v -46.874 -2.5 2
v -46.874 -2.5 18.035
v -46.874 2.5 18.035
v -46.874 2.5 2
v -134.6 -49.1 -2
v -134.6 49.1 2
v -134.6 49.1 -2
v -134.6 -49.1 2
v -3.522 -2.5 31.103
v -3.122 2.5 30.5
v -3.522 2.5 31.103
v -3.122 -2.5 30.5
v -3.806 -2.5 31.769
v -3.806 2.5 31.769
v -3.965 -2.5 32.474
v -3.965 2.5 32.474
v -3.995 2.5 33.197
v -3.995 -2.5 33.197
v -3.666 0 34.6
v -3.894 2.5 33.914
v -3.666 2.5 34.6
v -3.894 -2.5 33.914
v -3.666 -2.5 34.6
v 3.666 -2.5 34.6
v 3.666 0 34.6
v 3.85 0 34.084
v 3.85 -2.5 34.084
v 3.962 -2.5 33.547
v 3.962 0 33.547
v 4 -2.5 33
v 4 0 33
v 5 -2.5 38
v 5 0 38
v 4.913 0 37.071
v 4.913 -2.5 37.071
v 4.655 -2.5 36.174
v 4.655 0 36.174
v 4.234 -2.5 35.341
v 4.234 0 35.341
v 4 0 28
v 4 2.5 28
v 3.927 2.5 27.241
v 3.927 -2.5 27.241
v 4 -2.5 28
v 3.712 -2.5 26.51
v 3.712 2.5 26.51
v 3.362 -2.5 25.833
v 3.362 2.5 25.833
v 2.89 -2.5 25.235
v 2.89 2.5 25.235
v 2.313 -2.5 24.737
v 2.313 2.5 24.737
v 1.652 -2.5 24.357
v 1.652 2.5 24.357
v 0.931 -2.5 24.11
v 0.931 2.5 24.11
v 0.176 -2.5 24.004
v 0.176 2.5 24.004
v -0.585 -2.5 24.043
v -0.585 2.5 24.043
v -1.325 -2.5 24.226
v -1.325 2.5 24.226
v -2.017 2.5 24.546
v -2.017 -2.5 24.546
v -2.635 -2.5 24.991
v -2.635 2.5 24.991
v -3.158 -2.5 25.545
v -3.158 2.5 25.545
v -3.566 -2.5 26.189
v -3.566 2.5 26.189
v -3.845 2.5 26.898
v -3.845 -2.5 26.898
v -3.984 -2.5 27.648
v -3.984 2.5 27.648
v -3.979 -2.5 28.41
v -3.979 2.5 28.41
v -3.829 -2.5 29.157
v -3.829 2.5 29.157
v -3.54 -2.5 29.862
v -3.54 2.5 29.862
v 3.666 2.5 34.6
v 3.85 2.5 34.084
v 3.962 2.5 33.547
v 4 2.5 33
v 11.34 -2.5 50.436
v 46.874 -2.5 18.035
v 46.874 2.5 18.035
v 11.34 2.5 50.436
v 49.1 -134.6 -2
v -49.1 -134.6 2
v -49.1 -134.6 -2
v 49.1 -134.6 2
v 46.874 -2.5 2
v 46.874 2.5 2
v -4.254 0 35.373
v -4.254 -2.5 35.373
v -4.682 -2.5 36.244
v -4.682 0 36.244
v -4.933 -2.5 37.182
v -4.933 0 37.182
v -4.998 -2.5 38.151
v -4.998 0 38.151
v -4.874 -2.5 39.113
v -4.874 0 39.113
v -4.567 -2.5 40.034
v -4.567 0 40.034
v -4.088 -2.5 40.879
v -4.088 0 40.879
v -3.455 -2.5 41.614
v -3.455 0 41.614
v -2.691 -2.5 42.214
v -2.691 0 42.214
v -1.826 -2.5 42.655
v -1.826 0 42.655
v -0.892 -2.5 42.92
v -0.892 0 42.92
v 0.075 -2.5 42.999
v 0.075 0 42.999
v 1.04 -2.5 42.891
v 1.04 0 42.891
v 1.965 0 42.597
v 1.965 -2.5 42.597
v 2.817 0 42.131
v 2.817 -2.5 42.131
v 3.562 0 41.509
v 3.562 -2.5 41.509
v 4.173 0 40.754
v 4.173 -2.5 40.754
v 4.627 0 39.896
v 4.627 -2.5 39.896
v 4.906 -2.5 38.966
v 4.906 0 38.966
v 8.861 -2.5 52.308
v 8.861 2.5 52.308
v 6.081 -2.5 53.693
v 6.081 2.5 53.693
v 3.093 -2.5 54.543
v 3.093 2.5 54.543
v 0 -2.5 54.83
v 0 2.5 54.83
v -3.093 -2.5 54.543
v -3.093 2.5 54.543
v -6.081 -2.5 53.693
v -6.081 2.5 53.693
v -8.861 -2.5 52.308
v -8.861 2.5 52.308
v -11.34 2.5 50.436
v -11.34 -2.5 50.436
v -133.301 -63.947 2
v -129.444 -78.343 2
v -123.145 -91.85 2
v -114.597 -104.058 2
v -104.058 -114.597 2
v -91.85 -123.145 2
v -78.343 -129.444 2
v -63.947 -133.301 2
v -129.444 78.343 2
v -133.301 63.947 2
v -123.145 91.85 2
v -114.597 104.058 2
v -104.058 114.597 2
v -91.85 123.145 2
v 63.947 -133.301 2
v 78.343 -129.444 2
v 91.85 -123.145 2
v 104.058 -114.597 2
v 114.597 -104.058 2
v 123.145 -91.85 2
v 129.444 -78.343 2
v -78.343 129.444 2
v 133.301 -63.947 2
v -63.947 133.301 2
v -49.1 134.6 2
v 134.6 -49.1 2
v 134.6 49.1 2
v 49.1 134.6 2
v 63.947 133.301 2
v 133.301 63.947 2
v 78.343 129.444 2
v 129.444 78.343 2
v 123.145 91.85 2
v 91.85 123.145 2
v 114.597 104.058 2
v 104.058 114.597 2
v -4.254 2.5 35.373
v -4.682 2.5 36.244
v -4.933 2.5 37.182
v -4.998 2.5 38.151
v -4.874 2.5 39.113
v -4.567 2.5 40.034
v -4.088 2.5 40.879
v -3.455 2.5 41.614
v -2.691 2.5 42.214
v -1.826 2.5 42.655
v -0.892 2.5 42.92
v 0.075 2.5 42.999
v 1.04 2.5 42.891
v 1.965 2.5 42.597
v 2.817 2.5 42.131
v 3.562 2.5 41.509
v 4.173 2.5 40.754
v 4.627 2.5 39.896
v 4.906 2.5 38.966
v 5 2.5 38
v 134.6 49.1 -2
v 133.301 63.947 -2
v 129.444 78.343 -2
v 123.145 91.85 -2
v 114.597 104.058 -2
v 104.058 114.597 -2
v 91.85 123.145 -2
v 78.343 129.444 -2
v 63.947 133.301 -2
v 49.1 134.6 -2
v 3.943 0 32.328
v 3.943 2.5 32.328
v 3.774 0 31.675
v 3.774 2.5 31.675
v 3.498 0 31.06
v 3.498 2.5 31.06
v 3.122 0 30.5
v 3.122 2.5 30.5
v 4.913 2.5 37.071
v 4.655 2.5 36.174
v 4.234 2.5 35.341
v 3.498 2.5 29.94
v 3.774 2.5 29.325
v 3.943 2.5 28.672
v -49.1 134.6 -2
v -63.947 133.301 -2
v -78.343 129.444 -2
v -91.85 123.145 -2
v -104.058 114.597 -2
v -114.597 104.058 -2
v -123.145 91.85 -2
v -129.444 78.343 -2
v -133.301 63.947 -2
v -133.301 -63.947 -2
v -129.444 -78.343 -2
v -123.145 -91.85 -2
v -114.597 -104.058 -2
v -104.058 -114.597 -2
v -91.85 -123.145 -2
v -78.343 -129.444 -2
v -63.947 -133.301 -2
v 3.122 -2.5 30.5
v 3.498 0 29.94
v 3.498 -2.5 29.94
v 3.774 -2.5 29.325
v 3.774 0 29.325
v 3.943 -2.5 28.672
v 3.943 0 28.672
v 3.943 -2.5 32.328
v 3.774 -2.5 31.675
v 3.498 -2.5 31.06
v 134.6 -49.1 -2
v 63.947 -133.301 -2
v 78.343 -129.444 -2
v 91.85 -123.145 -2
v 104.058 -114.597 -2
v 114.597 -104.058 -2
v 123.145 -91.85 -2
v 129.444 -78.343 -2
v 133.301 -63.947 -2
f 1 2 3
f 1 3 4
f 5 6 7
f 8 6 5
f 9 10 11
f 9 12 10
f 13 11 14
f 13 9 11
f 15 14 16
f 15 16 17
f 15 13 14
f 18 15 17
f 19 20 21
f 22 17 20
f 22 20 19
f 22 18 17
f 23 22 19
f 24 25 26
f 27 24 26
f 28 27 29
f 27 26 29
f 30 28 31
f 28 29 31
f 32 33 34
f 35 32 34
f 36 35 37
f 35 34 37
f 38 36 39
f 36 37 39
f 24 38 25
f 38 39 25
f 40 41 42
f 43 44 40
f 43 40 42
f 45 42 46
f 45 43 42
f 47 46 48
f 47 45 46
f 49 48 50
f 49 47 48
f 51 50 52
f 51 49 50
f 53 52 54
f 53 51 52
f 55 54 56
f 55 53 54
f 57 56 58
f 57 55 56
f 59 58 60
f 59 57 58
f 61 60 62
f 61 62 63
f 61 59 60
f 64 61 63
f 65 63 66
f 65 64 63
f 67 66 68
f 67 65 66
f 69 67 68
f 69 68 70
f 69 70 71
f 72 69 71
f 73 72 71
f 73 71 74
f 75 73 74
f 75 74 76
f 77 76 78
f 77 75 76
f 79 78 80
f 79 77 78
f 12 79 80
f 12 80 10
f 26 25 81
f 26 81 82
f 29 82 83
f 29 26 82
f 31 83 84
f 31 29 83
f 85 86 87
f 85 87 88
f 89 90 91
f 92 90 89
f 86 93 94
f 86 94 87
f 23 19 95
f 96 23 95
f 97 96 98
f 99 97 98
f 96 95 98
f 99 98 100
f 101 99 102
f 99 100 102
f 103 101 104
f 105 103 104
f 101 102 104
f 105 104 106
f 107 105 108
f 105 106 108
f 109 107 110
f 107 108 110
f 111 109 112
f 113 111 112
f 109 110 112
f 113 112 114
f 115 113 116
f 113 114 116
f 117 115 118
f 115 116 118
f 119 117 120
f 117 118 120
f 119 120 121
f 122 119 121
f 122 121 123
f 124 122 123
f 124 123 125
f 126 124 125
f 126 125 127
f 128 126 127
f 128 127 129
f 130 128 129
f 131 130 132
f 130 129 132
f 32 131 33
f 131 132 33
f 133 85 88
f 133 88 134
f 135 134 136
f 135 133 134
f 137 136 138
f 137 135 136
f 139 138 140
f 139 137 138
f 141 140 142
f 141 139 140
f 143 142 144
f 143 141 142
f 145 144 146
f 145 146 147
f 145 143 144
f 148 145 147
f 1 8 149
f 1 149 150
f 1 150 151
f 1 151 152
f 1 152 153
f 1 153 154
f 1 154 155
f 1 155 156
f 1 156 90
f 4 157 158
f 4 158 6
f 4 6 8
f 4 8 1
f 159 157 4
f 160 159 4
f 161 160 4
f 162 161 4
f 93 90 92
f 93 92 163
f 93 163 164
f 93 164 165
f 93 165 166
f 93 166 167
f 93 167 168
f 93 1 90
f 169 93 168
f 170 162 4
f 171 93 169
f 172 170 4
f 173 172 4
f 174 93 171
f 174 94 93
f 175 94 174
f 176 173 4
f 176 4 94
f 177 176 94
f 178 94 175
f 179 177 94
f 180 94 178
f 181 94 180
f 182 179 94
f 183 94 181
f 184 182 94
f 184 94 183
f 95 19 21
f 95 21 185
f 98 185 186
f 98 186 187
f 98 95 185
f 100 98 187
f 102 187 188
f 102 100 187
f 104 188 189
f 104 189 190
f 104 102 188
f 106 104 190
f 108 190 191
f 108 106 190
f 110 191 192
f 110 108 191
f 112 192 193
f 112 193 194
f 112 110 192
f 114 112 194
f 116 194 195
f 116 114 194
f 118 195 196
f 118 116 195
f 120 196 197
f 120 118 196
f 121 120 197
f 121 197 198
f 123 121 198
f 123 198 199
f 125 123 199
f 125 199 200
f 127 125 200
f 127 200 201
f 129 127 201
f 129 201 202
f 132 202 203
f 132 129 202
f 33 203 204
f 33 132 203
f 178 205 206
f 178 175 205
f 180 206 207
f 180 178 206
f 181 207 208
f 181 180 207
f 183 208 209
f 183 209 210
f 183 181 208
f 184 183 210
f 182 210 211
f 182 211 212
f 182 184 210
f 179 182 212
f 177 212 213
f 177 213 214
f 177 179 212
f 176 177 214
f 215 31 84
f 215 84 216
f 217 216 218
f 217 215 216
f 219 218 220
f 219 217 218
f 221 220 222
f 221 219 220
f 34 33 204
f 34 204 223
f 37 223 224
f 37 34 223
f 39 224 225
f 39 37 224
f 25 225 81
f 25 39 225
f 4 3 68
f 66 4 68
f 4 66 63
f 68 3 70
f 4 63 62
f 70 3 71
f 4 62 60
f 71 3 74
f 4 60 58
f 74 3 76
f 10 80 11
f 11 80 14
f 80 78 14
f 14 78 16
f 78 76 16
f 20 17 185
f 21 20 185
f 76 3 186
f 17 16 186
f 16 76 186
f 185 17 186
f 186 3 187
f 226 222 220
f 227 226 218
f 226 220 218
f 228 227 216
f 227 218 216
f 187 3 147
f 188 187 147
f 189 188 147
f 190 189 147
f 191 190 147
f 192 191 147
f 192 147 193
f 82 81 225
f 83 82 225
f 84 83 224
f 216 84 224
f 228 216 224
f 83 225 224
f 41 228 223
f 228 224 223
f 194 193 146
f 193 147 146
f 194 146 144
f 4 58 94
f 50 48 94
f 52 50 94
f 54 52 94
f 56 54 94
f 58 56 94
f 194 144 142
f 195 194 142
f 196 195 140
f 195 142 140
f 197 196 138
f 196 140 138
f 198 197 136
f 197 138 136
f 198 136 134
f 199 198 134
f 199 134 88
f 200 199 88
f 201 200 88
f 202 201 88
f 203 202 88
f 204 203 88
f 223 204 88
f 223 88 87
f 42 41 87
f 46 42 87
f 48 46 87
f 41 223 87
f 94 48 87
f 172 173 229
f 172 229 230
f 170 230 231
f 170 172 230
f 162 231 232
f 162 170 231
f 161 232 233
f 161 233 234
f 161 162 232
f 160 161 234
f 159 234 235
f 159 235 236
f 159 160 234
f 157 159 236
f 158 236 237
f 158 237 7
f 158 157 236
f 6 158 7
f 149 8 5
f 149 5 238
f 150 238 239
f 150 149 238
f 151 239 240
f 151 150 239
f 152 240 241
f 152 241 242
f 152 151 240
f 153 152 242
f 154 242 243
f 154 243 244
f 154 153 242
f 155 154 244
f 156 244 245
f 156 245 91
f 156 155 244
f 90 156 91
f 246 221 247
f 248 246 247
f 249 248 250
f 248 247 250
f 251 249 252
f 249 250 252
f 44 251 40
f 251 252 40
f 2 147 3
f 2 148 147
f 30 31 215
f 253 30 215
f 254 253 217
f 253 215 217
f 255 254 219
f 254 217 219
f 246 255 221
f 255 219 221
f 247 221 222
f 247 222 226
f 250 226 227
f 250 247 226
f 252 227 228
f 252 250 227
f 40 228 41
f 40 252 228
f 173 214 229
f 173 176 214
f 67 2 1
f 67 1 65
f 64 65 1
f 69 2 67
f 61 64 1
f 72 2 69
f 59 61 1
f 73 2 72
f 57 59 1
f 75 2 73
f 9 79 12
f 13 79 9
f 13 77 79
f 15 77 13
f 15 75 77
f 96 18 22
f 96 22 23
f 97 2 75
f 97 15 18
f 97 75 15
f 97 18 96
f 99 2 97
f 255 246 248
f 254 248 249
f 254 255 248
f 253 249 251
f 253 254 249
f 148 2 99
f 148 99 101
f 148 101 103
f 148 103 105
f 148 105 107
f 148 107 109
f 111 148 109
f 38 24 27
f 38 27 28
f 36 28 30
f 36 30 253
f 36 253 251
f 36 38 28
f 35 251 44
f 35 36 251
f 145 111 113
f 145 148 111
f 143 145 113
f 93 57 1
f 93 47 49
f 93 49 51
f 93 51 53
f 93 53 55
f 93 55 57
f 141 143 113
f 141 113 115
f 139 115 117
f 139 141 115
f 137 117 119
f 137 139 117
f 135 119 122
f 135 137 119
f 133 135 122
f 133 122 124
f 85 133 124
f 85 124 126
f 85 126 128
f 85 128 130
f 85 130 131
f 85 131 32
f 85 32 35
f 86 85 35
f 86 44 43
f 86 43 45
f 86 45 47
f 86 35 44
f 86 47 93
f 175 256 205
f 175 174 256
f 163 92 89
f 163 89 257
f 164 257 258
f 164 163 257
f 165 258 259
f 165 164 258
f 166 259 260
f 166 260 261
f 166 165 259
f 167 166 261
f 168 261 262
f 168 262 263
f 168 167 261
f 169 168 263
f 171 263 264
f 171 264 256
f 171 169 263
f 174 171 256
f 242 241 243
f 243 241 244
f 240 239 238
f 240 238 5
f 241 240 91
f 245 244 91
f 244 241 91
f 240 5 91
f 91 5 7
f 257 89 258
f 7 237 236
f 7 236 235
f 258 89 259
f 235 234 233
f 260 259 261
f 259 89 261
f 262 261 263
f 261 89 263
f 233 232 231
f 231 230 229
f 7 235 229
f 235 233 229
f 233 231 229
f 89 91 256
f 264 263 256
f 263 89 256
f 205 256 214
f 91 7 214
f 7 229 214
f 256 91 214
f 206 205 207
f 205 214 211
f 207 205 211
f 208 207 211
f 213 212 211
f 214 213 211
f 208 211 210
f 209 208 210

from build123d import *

# Parameters (mm, degrees)
F1_DEPTH = 2
F3_DEPTH = 2.5


with BuildPart() as f1:
    # F0 (on Top) → F1 (new body, symmetric)
    with BuildSketch(Plane.XY):
        with BuildLine():
            Line((49.1, 134.6), (-49.1, 134.6))
            ThreePointArc((-49.1, 134.6), (-109.5576297914, 109.5576297914), (-134.6, 49.1))
            Line((-134.6, 49.1), (-134.6, -49.1))
            ThreePointArc((-134.6, -49.1), (-109.5576297914, -109.5576297914), (-49.1, -134.6))
            Line((-49.1, -134.6), (49.1, -134.6))
            ThreePointArc((49.1, -134.6), (109.5576297914, -109.5576297914), (134.6, -49.1))
            Line((134.6, -49.1), (134.6, 49.1))
            ThreePointArc((134.6, 49.1), (109.5576297914, 109.5576297914), (49.1, 134.6))
        make_face()
    extrude(amount=F1_DEPTH, both=True)

    # F2 (on Front) → F3 (join, symmetric)
    with BuildSketch(Plane.XZ):
        with BuildLine():
            Line((-46.8736924231, 0), (0, 0))
            Line((0, 0), (46.8736924231, 0))
            Line((46.8736924231, 0), (46.8736924231, 18.0345661938))
            Line((46.8736924231, 18.0345661938), (11.3395565202, 50.4359355817))
            ThreePointArc((11.3395565202, 50.4359355817), (0, 54.829677236), (-11.3395565202, 50.4359355817))
            Line((-11.3395565202, 50.4359355817), (-46.8736924231, 18.0345661938))
            Line((-46.8736924231, 18.0345661938), (-46.8736924231, 0))
        make_face()
        with BuildLine():
            ThreePointArc((-3.666060556, 34.6), (-1.8261567868, 42.6545839116), (5, 38))
            ThreePointArc((5, 38), (4.6545839116, 36.1738432132), (3.666060556, 34.6))
            ThreePointArc((3.666060556, 34.6), (3.9156252517, 33.8172385748), (4, 33))
            ThreePointArc((4, 33), (3.7742546282, 31.6752351146), (3.1224989992, 30.5))
            ThreePointArc((3.1224989992, 30.5), (3.7742546282, 29.3247648854), (4, 28))
            ThreePointArc((4, 28), (-1.3247648854, 24.2257453718), (-3.1224989992, 30.5))
            ThreePointArc((-3.1224989992, 30.5), (-3.9653039239, 32.4742959088), (-3.666060556, 34.6))
        make_face(mode=Mode.SUBTRACT)
    extrude(amount=F3_DEPTH, both=True)


solid = f1.part
